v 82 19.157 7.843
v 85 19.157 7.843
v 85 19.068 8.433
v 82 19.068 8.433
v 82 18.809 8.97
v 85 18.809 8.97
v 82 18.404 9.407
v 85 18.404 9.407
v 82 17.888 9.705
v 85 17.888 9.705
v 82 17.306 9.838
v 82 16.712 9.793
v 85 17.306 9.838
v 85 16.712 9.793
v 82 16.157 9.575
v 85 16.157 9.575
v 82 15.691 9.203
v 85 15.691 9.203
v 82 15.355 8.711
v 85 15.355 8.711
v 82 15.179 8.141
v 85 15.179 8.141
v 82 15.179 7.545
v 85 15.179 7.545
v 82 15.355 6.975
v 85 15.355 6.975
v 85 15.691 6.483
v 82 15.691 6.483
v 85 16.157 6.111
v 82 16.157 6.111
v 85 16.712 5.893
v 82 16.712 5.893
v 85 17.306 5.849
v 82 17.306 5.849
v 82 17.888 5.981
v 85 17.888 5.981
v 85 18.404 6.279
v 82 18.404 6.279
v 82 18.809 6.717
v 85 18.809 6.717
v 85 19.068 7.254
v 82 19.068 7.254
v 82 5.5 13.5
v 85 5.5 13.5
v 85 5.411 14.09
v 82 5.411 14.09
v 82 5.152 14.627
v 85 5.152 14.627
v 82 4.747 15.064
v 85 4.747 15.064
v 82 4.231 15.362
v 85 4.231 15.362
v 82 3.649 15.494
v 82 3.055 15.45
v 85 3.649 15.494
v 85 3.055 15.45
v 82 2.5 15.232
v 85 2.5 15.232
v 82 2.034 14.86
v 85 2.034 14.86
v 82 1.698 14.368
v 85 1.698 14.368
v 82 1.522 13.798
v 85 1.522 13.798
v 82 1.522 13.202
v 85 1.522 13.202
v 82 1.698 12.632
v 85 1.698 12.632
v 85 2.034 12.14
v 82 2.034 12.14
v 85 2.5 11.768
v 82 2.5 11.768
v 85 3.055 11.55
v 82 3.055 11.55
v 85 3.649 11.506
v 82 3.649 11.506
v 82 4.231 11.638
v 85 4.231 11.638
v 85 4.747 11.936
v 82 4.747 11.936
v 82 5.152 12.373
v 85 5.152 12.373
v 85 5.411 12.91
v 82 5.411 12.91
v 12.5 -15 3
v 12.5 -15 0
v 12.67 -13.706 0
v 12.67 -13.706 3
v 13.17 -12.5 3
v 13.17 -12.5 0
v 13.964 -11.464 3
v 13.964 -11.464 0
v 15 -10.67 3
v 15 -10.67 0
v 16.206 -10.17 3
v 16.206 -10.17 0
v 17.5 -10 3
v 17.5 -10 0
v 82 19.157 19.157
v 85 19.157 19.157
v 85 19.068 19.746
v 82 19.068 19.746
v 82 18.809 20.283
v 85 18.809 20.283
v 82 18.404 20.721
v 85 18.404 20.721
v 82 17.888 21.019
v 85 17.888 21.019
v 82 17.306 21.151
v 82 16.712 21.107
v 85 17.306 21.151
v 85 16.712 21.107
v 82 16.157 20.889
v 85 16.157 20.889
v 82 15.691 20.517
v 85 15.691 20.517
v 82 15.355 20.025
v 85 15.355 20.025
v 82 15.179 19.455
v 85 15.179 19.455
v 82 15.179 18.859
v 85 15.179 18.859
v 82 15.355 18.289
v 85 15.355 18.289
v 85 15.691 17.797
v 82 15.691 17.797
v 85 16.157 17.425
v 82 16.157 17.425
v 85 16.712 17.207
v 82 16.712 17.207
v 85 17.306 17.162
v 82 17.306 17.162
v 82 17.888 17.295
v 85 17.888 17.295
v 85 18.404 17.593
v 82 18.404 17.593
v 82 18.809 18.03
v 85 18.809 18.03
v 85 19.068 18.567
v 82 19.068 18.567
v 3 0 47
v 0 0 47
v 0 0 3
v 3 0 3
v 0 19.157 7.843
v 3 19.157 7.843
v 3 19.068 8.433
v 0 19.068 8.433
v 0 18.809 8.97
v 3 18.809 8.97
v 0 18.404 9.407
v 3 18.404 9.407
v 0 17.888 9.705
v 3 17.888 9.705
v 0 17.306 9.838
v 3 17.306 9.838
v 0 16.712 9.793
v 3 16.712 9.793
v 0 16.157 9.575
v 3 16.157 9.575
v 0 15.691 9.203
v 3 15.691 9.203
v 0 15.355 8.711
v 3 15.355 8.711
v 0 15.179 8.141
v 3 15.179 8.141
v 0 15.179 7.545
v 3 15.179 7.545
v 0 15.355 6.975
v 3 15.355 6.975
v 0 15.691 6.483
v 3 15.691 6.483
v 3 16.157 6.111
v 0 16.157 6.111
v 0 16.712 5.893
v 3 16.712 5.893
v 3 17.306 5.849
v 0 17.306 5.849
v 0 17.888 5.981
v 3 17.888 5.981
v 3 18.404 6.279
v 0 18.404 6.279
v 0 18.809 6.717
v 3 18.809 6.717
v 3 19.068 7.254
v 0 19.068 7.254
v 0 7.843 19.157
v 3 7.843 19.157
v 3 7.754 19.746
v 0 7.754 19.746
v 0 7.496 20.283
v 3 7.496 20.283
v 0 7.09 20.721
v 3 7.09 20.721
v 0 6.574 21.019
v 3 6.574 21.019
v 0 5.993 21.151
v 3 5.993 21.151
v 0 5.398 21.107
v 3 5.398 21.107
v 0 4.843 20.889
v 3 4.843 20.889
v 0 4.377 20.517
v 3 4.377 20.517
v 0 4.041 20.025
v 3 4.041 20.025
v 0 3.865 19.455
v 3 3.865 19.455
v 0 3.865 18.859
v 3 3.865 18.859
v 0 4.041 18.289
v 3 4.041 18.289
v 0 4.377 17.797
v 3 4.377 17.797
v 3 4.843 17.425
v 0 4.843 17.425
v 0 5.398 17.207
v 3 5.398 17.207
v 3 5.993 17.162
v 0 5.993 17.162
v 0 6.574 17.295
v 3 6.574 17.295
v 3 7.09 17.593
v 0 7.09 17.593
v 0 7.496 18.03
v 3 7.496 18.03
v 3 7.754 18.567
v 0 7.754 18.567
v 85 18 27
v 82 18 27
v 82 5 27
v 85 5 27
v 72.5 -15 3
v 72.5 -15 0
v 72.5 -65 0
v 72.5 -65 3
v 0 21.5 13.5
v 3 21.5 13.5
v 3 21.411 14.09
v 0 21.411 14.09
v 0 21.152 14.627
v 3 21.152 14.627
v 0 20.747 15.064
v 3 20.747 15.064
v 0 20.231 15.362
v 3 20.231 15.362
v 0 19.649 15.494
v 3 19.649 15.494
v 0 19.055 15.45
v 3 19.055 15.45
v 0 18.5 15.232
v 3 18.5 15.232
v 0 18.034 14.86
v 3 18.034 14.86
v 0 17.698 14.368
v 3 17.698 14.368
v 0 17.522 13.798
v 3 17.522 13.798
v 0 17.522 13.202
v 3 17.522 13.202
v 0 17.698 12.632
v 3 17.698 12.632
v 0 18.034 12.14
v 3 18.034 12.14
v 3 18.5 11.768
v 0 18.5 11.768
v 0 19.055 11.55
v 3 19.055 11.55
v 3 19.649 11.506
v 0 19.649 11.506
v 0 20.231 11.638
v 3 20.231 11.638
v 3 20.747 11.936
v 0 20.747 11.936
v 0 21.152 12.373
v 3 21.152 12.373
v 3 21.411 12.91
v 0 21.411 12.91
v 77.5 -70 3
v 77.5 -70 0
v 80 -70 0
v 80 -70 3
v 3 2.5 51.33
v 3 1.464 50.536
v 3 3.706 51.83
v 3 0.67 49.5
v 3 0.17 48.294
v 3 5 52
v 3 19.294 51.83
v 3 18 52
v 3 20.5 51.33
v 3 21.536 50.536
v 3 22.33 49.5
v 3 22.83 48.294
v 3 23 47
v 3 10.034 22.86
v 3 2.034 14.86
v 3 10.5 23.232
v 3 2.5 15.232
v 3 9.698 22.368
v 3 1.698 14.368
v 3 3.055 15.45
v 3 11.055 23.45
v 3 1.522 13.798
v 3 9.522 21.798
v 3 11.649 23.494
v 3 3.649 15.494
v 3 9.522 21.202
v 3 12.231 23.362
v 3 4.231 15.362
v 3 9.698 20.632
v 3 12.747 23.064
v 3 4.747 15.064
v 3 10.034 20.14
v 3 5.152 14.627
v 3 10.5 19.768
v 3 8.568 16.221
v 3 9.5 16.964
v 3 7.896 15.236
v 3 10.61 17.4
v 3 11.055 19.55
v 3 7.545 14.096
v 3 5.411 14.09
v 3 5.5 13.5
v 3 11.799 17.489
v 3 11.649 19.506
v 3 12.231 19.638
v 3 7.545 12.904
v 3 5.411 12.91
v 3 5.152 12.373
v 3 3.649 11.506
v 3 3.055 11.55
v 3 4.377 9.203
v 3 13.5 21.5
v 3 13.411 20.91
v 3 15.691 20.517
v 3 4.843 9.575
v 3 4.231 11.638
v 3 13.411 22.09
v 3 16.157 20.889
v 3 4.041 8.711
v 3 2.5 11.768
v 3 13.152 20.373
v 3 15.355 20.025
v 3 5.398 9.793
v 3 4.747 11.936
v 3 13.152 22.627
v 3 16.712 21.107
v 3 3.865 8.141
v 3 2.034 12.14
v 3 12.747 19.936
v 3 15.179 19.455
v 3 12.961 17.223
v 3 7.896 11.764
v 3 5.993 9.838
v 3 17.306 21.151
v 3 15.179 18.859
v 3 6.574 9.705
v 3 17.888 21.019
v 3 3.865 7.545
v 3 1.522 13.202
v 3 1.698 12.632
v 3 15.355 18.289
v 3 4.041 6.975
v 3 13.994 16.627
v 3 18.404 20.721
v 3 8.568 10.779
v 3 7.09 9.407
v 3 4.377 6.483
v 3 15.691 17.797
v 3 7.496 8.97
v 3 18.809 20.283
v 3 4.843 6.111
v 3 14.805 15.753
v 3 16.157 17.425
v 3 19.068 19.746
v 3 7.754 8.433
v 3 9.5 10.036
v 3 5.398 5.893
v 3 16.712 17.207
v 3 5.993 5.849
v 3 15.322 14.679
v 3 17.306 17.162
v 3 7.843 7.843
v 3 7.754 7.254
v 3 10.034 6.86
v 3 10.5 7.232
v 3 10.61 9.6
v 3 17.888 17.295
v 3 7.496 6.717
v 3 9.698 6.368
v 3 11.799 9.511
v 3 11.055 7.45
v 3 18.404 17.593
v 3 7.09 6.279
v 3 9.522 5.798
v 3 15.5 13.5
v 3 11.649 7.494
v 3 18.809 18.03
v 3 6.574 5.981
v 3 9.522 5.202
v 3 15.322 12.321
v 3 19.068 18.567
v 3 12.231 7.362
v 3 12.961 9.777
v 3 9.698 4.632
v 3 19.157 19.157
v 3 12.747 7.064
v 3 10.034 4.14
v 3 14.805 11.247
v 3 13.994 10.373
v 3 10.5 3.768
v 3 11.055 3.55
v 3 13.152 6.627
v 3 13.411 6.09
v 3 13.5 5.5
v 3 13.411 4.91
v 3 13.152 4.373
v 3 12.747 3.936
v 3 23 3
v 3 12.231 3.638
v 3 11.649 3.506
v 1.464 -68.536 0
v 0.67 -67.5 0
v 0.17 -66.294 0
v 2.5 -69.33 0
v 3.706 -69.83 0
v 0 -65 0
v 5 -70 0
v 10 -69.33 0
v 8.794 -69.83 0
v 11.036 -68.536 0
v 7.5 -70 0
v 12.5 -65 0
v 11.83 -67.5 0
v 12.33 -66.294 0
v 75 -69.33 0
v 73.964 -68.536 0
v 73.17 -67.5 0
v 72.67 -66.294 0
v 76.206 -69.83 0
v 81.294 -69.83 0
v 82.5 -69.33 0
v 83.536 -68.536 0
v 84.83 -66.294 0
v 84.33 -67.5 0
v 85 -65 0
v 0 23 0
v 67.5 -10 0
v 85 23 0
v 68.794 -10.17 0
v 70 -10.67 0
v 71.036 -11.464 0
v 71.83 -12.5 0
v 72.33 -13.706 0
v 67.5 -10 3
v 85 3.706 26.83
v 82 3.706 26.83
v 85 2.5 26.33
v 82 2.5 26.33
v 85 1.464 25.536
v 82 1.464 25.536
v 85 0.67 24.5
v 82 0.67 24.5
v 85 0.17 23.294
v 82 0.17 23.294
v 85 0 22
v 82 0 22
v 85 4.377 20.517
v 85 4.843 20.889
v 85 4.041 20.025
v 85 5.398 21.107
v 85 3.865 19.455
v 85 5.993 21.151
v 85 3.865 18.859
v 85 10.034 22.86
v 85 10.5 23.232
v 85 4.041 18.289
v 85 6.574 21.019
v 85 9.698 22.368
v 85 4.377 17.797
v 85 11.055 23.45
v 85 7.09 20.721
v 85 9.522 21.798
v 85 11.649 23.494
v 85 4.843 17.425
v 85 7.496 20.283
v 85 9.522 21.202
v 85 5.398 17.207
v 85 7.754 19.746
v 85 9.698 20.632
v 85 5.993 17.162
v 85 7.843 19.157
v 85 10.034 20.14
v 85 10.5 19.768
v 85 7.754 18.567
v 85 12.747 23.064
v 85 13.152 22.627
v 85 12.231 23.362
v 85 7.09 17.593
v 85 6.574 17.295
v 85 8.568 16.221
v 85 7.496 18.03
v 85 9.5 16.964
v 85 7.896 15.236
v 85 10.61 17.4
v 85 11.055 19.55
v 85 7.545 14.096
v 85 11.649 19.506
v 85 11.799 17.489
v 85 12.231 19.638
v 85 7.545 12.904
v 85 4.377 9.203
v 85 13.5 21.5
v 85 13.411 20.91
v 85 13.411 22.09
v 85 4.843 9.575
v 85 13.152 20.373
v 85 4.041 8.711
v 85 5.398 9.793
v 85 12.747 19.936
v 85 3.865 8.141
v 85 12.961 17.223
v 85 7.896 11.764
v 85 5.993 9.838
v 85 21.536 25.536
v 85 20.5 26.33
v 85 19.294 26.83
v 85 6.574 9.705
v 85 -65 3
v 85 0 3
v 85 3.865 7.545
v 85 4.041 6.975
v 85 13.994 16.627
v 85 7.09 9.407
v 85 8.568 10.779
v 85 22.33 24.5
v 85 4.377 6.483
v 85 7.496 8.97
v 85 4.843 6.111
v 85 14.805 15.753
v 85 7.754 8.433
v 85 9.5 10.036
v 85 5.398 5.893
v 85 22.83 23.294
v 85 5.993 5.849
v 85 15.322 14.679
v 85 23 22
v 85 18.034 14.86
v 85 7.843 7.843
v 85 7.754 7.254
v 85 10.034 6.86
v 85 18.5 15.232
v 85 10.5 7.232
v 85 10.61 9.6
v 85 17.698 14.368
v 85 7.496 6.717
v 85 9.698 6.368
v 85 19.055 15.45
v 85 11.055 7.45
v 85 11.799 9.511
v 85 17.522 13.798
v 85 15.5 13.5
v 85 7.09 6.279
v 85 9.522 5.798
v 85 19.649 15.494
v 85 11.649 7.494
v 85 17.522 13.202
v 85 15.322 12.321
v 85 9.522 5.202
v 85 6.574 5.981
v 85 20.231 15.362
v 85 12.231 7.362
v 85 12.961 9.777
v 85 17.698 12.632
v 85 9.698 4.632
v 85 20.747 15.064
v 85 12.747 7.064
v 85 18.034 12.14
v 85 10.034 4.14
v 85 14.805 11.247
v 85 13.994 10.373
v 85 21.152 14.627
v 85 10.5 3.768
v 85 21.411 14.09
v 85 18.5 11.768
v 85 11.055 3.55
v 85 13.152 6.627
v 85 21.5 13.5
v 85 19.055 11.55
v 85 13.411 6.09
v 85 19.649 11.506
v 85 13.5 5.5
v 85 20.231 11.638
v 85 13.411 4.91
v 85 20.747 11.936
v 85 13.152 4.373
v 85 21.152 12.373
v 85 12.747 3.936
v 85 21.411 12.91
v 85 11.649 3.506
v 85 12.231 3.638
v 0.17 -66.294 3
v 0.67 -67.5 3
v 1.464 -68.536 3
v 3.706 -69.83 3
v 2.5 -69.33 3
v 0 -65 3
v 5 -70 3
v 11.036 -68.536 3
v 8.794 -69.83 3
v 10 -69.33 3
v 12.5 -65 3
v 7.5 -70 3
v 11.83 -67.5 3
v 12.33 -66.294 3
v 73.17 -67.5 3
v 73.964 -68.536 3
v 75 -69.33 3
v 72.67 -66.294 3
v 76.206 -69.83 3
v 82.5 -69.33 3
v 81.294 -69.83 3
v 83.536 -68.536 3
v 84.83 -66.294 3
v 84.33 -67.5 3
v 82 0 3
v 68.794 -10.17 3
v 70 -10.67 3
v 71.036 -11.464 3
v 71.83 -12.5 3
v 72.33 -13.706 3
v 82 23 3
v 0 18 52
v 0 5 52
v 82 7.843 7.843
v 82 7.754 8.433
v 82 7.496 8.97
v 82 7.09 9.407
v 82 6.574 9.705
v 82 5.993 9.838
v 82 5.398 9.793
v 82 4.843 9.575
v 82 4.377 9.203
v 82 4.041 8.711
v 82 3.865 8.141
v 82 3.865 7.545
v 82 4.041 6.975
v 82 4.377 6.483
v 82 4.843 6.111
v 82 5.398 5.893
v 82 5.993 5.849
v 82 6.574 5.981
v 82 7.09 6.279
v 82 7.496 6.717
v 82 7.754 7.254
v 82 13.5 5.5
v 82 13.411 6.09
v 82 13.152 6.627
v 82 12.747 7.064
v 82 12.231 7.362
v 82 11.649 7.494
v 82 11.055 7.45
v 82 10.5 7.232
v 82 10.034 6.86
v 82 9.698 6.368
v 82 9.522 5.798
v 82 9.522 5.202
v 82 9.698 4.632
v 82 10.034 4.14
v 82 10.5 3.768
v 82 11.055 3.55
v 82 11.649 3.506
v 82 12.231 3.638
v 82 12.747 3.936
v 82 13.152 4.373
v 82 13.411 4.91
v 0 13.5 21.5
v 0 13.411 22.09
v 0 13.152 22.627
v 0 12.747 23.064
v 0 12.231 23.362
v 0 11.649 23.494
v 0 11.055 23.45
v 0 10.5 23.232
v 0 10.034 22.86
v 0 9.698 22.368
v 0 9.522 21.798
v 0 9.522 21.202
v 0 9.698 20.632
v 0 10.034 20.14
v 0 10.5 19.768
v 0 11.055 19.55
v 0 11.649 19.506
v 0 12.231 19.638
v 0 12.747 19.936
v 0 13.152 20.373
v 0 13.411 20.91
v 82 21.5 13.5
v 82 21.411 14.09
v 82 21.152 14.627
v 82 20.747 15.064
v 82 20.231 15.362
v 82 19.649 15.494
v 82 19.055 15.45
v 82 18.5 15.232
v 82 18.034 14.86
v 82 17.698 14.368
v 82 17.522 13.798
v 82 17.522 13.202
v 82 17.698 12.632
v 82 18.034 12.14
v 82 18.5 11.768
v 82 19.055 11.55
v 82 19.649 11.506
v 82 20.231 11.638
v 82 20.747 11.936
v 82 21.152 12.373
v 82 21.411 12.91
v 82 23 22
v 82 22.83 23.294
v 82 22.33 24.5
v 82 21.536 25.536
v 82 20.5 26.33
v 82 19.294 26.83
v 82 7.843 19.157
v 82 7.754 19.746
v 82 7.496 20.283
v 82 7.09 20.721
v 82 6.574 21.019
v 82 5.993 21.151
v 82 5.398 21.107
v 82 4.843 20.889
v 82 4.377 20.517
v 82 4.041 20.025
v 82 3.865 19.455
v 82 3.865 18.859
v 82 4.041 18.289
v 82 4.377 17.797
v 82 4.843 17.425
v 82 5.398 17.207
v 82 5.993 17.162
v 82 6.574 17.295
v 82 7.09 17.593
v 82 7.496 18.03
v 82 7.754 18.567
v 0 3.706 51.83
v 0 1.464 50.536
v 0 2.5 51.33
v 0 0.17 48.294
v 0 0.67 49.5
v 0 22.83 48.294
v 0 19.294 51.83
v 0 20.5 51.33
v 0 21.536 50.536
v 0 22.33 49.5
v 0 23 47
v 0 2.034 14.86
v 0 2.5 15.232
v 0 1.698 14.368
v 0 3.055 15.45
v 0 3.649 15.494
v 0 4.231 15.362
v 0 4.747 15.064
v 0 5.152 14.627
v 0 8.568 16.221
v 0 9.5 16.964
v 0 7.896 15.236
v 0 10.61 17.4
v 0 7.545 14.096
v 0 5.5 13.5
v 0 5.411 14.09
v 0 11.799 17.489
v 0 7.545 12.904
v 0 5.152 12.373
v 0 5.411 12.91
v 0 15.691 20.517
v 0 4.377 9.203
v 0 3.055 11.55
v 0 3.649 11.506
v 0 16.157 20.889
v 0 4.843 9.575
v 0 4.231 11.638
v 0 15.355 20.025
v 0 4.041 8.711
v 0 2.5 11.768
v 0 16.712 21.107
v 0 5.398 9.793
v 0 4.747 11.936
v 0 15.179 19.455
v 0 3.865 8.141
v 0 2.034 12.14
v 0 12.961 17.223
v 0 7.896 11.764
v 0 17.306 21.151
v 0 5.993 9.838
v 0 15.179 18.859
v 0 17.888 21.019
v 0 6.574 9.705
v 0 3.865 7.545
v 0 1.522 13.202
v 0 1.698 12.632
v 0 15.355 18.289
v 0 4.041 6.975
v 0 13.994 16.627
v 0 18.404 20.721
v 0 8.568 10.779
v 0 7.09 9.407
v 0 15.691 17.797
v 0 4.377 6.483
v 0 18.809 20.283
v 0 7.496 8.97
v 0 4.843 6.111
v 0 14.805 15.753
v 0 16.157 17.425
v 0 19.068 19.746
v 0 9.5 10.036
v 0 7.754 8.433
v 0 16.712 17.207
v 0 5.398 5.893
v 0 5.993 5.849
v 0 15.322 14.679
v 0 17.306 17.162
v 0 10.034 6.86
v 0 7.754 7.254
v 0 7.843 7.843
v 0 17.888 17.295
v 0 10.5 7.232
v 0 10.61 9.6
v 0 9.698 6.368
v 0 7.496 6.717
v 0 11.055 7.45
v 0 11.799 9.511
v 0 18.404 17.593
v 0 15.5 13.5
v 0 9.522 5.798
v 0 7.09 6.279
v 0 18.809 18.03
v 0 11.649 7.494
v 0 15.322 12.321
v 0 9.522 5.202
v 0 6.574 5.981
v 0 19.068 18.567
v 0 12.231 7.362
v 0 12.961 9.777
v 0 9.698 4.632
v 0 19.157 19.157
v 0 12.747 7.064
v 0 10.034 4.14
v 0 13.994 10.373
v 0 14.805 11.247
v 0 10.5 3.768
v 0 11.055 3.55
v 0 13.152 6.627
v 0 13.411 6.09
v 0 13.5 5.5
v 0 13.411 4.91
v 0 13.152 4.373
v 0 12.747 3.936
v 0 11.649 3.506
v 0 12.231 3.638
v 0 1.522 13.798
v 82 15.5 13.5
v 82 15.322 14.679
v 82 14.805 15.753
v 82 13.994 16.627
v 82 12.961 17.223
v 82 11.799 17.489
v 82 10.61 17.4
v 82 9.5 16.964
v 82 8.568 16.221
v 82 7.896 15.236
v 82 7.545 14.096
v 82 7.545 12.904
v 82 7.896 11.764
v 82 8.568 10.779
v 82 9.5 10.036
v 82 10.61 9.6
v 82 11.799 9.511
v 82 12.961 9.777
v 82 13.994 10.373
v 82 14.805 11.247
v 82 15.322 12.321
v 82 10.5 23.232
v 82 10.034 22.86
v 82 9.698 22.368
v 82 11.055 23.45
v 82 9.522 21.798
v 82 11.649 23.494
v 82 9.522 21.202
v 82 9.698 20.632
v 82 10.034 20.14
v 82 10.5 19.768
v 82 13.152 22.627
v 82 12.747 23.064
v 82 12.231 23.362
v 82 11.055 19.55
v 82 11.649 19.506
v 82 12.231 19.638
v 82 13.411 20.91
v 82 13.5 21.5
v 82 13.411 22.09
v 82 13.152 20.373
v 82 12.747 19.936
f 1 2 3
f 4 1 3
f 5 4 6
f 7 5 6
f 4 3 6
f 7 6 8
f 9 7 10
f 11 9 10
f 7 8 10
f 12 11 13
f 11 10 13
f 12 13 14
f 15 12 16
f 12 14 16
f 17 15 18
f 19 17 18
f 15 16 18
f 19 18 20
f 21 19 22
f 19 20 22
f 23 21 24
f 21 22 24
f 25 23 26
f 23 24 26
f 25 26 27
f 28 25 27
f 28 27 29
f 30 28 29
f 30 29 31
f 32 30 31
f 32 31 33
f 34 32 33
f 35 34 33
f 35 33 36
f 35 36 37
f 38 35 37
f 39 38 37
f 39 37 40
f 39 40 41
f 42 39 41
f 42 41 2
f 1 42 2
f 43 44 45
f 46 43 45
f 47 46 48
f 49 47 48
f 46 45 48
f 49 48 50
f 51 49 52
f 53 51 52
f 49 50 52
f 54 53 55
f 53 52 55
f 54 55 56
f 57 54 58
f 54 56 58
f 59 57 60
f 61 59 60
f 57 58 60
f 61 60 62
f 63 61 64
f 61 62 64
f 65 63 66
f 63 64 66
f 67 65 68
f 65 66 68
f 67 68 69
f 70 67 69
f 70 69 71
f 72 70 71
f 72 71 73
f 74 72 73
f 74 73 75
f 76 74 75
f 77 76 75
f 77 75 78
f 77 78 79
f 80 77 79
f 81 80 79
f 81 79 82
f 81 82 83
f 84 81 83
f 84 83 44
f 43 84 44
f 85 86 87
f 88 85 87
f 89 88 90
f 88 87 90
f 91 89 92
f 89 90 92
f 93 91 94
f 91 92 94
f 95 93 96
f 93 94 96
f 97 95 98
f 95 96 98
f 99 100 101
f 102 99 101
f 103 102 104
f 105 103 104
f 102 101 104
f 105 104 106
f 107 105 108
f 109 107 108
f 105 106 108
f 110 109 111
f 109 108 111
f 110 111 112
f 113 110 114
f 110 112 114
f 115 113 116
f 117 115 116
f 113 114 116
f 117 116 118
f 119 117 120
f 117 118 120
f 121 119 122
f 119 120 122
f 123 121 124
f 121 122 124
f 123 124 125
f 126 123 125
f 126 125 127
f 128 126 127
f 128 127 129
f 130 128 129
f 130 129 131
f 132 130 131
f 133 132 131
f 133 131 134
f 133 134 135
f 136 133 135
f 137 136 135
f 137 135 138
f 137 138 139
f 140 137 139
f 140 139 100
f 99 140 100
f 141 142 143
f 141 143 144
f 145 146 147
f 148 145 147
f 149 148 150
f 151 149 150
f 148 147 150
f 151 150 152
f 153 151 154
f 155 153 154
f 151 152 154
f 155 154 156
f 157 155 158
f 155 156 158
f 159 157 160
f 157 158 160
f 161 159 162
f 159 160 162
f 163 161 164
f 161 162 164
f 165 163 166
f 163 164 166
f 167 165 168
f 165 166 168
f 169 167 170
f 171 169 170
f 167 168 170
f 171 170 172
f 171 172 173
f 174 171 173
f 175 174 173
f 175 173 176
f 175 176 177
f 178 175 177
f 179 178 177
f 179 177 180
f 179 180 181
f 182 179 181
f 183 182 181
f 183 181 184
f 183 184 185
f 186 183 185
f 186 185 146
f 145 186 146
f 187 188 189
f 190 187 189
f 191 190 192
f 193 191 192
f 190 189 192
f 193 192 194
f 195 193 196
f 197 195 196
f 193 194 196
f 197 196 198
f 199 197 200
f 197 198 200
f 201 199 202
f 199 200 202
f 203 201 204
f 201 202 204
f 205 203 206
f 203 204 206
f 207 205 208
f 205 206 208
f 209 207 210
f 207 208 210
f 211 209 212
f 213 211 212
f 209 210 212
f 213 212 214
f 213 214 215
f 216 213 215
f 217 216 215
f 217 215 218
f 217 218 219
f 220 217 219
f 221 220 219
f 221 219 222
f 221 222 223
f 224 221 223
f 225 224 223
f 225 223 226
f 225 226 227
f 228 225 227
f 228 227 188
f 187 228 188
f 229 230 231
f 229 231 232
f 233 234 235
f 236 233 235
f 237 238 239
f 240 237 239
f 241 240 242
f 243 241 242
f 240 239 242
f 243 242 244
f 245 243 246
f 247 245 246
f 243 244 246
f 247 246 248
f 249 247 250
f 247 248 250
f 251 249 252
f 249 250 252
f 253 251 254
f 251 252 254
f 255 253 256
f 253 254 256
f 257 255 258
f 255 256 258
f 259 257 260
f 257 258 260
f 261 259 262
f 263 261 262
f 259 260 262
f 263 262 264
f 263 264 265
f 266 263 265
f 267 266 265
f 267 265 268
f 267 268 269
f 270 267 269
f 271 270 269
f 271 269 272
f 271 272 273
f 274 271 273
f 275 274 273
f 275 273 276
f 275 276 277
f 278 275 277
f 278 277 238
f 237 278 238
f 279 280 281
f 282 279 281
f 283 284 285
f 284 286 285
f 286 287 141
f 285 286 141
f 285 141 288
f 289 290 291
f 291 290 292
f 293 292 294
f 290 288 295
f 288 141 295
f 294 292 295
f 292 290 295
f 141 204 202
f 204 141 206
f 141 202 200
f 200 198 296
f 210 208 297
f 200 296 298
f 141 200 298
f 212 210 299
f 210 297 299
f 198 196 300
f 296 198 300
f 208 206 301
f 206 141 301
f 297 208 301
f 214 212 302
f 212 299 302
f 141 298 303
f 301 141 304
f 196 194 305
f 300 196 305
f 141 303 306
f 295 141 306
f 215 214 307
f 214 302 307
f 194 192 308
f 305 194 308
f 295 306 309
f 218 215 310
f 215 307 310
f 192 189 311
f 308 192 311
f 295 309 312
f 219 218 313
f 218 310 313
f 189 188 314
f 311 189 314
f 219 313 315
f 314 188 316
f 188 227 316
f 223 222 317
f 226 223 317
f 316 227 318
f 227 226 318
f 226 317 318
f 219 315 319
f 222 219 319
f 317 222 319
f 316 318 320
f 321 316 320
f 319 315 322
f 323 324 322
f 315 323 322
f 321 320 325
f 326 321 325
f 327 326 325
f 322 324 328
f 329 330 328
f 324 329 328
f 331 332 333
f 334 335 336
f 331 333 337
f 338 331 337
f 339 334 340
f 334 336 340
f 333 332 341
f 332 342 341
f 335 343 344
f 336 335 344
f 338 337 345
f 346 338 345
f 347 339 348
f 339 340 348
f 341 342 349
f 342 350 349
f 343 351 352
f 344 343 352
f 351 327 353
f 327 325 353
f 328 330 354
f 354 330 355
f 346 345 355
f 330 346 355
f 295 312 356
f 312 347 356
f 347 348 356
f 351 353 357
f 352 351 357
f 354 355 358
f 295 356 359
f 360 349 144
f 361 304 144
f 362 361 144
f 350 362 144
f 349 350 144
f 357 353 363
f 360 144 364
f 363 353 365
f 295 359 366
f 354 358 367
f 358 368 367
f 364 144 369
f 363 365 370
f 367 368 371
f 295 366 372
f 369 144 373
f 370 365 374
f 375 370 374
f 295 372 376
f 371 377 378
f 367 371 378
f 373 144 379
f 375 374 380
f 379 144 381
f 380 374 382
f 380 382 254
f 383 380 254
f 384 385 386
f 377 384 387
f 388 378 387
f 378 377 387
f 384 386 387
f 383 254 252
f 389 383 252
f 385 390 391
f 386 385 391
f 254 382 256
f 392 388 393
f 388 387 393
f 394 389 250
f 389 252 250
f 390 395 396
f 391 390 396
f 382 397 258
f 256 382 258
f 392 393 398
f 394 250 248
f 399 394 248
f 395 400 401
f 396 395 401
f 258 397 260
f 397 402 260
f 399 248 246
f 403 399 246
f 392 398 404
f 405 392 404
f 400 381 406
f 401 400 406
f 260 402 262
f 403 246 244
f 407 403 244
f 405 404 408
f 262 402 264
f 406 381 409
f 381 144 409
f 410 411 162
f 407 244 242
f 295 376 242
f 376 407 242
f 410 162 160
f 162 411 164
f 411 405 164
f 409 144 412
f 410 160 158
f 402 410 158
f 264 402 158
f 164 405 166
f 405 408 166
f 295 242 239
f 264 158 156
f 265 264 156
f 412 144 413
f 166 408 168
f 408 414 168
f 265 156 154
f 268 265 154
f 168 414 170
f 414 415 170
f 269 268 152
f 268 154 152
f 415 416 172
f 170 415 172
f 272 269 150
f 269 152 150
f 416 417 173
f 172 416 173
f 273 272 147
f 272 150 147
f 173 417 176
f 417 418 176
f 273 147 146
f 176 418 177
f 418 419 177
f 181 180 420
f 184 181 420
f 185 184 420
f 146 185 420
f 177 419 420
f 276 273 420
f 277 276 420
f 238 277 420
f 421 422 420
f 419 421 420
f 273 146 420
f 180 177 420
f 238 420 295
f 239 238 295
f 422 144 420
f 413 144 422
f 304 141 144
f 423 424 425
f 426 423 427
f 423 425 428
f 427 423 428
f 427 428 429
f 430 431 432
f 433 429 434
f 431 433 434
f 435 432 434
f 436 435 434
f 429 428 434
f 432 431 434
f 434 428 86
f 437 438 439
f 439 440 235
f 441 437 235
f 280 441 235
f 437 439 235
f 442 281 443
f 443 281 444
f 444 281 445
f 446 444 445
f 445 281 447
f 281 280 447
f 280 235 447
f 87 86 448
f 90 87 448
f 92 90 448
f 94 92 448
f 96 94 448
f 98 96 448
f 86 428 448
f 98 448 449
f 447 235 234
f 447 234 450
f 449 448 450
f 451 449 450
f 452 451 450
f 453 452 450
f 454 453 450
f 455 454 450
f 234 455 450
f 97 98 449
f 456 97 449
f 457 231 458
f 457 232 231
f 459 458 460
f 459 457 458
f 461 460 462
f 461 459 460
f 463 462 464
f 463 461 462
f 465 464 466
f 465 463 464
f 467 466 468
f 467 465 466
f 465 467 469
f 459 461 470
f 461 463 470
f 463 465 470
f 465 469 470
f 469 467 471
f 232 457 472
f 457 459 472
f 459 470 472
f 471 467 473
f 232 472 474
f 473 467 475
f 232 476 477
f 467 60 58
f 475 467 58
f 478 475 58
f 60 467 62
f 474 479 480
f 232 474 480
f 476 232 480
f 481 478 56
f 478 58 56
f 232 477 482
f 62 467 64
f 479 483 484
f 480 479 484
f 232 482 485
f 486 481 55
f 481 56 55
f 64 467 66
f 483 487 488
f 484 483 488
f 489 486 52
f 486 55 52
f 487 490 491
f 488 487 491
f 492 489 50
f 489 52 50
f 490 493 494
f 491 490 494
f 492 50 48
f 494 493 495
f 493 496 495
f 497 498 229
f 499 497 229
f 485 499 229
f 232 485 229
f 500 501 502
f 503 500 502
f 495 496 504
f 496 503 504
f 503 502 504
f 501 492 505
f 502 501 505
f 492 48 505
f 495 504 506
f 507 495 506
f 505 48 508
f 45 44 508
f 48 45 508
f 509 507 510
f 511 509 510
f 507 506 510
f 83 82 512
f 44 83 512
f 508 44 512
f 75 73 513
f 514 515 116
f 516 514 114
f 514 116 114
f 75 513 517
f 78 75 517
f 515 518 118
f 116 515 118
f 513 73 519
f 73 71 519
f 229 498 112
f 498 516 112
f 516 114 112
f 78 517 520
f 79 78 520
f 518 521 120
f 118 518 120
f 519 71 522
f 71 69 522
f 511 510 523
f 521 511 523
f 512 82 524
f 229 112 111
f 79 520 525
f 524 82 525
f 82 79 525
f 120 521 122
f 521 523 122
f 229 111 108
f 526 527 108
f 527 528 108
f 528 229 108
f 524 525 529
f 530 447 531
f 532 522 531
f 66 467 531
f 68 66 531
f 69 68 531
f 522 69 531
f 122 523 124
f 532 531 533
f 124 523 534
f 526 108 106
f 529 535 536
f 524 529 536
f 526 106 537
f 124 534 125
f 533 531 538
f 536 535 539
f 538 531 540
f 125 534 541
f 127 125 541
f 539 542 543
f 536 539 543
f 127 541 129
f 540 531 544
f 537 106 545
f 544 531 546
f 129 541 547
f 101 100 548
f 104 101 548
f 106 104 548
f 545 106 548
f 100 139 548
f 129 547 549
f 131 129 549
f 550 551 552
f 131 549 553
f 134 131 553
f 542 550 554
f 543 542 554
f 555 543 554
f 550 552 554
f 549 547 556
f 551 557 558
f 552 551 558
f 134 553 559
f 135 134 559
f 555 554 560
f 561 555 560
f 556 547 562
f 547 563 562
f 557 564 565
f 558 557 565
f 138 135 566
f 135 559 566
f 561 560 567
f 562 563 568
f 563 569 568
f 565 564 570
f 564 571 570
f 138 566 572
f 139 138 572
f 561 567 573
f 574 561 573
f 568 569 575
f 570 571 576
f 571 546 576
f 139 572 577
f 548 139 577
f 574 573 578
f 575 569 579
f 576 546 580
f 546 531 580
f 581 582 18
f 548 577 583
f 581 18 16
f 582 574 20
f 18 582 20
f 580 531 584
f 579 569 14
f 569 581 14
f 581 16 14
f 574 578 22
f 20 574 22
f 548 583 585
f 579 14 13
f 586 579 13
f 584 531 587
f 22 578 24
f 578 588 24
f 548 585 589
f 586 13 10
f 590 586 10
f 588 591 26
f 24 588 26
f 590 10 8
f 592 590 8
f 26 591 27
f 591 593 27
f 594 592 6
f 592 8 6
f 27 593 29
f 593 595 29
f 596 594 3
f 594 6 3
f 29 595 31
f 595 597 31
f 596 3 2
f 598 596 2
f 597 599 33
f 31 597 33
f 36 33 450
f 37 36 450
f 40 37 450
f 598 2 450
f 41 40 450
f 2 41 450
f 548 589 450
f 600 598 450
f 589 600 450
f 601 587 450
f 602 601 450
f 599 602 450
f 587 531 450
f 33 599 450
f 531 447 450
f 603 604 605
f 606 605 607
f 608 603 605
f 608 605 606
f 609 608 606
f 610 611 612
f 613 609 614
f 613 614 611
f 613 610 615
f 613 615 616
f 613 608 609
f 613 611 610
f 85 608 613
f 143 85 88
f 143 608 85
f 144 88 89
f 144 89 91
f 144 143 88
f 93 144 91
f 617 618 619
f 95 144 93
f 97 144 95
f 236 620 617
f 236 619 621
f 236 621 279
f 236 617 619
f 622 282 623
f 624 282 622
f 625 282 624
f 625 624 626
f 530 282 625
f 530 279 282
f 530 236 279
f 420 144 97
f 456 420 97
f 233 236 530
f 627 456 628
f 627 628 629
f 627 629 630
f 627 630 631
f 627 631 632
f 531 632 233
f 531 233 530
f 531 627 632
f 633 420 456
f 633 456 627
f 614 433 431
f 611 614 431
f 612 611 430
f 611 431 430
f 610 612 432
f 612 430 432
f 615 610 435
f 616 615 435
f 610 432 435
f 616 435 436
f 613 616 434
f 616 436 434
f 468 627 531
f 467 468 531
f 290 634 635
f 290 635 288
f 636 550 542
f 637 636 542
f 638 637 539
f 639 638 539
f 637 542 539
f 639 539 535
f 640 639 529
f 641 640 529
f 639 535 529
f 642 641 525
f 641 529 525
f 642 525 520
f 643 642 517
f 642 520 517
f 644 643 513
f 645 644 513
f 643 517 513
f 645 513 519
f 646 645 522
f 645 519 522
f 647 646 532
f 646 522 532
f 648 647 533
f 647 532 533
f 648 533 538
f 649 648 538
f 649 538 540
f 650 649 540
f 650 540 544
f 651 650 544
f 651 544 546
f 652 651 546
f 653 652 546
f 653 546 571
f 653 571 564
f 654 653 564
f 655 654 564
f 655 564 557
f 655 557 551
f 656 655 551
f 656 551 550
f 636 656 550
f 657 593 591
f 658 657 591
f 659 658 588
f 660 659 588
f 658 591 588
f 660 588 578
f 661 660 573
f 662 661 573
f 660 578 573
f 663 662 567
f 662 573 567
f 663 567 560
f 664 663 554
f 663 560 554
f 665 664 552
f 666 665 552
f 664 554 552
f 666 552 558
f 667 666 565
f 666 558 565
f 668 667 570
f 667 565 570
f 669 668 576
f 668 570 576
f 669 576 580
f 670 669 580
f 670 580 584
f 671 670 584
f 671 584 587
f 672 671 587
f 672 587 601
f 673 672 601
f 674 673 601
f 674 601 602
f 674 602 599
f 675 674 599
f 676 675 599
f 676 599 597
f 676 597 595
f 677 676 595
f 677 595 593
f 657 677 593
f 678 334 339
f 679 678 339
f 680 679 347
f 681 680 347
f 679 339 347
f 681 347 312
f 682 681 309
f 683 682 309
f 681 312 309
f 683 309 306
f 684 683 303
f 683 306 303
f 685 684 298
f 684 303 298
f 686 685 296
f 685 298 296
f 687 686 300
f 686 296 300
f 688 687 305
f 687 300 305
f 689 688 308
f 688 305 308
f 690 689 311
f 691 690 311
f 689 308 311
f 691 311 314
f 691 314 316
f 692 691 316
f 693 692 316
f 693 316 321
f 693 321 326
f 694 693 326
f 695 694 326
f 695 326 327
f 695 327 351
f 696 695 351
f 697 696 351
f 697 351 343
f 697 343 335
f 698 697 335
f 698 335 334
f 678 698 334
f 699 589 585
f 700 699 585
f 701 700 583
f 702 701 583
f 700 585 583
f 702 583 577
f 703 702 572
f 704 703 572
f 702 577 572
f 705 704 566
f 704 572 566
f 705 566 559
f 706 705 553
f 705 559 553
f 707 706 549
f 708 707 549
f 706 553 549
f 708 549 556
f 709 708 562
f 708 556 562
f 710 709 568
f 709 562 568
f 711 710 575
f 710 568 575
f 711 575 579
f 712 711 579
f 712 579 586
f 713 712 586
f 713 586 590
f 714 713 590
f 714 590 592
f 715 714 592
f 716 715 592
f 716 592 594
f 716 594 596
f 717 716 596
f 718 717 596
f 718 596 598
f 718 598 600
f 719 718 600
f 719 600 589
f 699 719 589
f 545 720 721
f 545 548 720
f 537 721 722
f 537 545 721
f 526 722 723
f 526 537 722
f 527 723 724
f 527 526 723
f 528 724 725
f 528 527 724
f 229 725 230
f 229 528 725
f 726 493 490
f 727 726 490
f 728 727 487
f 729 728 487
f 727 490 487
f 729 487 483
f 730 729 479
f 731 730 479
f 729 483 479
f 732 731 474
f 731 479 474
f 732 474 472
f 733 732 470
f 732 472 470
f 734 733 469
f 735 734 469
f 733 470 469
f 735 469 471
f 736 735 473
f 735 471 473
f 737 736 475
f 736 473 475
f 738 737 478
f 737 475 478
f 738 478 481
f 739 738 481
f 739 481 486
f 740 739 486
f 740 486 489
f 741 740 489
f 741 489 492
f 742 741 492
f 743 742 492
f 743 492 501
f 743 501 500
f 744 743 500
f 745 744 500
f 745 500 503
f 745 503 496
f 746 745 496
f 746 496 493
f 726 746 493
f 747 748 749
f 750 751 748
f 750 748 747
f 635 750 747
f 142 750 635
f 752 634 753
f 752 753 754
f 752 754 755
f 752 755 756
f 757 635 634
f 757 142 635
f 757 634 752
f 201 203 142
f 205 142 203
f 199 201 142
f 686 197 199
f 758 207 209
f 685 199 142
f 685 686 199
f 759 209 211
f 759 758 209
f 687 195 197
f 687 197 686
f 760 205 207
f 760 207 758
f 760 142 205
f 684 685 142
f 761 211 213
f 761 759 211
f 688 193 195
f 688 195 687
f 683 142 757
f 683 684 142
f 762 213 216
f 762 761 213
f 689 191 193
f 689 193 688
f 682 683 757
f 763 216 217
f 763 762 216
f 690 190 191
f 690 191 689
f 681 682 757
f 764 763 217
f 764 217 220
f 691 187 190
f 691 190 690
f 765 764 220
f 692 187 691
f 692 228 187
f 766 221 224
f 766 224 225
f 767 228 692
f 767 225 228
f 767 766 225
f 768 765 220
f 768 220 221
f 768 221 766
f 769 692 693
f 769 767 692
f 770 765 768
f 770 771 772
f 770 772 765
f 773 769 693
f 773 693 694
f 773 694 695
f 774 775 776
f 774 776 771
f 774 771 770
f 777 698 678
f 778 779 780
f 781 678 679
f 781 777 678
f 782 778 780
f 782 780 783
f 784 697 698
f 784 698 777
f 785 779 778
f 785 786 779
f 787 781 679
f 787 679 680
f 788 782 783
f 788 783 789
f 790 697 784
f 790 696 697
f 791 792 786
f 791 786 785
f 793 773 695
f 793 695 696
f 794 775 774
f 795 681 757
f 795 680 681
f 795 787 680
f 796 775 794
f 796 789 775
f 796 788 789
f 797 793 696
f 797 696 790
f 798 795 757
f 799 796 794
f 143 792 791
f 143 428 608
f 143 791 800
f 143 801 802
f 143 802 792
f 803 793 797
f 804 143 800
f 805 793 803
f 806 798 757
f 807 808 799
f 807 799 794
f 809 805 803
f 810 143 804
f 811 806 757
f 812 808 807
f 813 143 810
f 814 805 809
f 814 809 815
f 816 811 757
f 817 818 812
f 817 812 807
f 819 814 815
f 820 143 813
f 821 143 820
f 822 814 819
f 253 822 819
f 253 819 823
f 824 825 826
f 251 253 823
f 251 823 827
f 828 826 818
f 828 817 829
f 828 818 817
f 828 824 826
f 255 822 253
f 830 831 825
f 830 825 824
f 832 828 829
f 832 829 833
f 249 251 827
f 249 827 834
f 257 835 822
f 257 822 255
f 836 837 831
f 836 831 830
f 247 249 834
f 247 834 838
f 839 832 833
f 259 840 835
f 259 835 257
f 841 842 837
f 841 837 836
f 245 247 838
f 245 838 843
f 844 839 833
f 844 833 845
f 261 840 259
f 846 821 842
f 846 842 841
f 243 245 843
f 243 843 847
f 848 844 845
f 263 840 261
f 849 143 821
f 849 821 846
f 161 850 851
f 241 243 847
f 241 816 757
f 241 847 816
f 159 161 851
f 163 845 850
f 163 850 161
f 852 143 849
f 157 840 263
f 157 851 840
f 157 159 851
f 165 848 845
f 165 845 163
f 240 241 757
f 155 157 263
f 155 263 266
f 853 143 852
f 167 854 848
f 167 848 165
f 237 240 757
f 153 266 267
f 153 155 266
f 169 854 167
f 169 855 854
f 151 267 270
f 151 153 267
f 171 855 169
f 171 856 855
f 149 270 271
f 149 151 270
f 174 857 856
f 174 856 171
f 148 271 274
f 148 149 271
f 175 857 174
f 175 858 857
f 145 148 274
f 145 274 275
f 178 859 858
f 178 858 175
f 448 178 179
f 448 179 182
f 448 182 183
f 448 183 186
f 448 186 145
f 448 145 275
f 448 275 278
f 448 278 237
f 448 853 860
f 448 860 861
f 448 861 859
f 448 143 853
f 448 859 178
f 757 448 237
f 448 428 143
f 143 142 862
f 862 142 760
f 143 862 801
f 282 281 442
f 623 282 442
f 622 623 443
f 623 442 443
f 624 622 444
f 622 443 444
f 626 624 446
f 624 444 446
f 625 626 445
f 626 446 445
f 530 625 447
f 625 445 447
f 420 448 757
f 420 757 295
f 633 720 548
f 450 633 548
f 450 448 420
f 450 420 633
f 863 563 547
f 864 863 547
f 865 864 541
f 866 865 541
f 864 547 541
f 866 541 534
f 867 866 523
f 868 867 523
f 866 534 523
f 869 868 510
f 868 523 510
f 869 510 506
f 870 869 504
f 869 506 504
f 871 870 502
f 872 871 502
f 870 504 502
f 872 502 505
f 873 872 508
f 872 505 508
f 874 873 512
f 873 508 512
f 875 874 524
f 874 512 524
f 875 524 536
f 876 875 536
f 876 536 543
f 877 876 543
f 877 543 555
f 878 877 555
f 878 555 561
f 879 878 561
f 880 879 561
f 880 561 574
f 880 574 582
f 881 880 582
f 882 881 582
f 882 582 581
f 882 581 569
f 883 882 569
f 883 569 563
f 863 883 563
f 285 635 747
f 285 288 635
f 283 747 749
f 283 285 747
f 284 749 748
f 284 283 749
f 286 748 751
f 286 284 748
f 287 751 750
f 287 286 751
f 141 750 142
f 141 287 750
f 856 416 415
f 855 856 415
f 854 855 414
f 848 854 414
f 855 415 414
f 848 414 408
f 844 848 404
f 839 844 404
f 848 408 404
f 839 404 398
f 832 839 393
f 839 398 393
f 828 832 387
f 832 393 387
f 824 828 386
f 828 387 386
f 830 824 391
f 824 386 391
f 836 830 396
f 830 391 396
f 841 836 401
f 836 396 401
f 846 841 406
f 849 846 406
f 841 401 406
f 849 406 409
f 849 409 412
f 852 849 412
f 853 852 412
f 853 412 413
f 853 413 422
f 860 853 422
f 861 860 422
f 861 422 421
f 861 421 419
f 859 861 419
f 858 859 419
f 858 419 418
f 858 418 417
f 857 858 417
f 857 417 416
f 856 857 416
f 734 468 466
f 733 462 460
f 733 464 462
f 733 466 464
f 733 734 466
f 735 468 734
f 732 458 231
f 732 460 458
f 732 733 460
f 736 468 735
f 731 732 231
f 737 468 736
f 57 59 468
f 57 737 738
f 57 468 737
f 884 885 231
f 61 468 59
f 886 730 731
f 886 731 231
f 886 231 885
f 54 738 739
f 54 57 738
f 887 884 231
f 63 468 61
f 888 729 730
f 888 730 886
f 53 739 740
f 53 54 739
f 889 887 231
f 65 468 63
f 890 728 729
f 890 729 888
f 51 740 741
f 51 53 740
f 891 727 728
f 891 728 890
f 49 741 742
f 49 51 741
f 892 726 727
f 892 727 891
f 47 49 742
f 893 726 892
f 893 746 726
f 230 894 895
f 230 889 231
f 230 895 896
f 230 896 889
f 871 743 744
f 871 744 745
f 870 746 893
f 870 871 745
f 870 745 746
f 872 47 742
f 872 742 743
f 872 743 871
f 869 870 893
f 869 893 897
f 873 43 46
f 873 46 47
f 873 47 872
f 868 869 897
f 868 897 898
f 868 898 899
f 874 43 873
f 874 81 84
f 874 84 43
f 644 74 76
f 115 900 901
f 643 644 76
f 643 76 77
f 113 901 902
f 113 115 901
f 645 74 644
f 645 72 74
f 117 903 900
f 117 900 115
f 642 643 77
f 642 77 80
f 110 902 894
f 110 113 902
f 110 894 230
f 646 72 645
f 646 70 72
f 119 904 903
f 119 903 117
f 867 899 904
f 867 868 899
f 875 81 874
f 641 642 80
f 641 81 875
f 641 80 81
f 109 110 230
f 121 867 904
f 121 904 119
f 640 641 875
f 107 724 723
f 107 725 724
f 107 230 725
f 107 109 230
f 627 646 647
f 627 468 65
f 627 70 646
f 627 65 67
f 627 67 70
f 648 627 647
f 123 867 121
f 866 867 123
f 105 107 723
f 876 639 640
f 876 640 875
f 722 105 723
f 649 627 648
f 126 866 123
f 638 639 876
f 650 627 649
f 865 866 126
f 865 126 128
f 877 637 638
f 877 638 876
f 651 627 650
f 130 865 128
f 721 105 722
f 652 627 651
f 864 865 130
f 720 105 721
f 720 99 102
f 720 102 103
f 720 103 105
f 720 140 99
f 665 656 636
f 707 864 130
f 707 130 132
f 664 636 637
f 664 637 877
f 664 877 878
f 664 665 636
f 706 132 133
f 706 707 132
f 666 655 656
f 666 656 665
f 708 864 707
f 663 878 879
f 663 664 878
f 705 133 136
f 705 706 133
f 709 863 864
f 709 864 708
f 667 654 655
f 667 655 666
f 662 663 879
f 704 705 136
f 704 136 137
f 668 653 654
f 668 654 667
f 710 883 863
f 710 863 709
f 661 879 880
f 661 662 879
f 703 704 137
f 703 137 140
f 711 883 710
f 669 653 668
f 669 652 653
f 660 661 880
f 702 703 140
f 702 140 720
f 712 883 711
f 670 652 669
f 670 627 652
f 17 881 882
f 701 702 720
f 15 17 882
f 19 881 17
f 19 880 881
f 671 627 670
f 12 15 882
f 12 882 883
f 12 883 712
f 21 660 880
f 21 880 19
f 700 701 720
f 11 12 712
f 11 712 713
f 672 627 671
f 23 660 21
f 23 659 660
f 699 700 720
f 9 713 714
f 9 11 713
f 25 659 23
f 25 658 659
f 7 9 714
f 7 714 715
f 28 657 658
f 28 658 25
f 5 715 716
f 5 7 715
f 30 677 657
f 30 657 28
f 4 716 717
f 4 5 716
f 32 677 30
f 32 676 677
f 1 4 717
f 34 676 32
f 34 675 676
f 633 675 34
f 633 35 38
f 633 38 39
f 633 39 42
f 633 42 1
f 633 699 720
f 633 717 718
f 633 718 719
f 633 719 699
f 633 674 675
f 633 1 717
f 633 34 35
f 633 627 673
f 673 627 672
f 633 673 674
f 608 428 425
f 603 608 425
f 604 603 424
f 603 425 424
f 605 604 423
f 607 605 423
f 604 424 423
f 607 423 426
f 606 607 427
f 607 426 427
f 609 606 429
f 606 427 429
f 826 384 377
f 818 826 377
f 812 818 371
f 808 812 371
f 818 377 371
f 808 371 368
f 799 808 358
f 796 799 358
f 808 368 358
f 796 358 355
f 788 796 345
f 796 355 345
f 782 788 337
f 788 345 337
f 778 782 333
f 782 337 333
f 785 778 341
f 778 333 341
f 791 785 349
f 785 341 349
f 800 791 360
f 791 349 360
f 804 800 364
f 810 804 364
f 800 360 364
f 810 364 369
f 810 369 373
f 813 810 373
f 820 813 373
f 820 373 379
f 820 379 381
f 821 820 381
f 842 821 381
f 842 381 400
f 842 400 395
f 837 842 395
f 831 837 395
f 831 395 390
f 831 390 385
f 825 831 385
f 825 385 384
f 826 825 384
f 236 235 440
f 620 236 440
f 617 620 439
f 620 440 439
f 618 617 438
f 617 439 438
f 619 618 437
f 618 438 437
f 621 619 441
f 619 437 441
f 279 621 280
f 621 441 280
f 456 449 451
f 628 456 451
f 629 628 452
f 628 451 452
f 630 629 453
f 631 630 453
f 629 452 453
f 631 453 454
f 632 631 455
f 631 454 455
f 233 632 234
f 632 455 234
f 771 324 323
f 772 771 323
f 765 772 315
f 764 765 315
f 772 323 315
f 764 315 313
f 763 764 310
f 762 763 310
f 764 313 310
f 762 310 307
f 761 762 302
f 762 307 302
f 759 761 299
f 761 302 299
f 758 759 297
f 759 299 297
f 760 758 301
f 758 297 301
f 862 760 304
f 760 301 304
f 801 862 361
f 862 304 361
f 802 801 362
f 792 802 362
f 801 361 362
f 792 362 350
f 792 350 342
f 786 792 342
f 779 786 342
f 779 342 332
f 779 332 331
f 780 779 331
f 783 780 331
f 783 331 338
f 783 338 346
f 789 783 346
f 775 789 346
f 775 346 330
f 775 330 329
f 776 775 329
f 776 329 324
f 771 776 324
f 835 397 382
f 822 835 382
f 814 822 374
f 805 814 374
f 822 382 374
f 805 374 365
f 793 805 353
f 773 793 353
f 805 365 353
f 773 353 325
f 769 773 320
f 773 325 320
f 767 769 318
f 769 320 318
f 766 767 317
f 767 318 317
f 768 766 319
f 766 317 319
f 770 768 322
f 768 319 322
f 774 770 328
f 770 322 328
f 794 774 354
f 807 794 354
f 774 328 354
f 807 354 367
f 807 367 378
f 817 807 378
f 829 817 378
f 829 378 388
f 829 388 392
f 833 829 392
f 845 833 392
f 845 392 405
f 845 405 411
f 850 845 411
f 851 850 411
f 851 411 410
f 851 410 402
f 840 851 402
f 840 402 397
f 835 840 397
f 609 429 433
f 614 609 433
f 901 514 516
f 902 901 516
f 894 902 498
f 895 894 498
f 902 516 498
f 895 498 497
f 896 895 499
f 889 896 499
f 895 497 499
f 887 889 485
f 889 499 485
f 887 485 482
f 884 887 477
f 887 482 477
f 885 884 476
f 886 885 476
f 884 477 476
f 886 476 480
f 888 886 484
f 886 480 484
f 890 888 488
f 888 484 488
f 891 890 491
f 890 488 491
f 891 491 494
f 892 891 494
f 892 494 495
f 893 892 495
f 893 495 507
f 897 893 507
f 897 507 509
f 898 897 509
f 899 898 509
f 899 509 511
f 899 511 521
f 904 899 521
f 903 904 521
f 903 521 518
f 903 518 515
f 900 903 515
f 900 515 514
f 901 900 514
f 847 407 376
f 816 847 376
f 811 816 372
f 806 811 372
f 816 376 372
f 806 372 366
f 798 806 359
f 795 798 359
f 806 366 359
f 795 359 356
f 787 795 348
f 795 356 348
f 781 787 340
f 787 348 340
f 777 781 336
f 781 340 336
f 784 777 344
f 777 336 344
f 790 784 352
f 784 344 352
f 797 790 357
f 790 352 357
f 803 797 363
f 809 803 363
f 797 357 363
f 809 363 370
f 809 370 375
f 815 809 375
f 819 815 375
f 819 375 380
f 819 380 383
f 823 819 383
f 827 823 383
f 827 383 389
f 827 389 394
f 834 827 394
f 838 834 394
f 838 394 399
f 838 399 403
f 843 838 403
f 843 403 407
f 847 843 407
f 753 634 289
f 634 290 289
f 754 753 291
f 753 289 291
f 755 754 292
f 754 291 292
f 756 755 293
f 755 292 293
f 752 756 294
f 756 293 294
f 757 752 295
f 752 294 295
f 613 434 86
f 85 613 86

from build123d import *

# Parameters (mm, degrees)
F0_W     = 85
F0_H     = 23
F1_DEPTH = 3
F2_W     = 3
F2_H     = 23
F3_DEPTH = 24
F4_W     = 3
F4_H     = 23
F5_DEPTH = 25
F6_R     = 4
F6_R_2   = 2
F7_DEPTH = 250
F8_R     = 5


with BuildPart() as f1:
    # F0 (on Top) → F1 (new body)
    with BuildSketch(Plane.XY):
        with Locations((42.5, 11.5)):
            Rectangle(F0_W, F0_H)
        with BuildLine():
            Line((85, 0), (0, 0))
            Line((0, 0), (0, -10))
            Line((0, -10), (0, -65))
            ThreePointArc((0, -65), (1.464466, -68.535534), (5, -70))
            Line((5, -70), (7.5, -70))
            ThreePointArc((7.5, -70), (11.035534, -68.535534), (12.5, -65))
            Line((12.5, -65), (12.5, -15))
            ThreePointArc((12.5, -15), (13.964466, -11.464466), (17.5, -10))
            Line((17.5, -10), (67.5, -10))
            ThreePointArc((67.5, -10), (71.035534, -11.464466), (72.5, -15))
            Line((72.5, -15), (72.5, -65))
            ThreePointArc((72.5, -65), (73.964466, -68.535534), (77.5, -70))
            Line((77.5, -70), (80, -70))
            ThreePointArc((80, -70), (83.535534, -68.535534), (85, -65))
            Line((85, -65), (85, -10))
            Line((85, -10), (85, 0))
        make_face()
    extrude(amount=F1_DEPTH)

    # F2 (on face) → F3 (join)
    with BuildSketch(Plane.XY.offset(3)):
        with Locations((1.5, 11.5)):
            Rectangle(F2_W, F2_H)
        with Locations((83.5, 11.5)):
            Rectangle(F2_W, F2_H)
    extrude(amount=F3_DEPTH)

    # F4 (on face) → F5 (join)
    with BuildSketch(Plane.XY.offset(27)):
        with Locations((1.5, 11.5)):
            Rectangle(F4_W, F4_H)
    extrude(amount=F5_DEPTH)

    # F6 (on face) → F7 (cut)
    with BuildSketch(Plane.YZ.offset(85)):
        with Locations((11.5, 13.5)):
            Circle(F6_R)
        with Locations((5.843146, 19.156854)):
            Circle(F6_R_2)
        with Locations((11.5, 21.5)):
            Circle(F6_R_2)
        with Locations((17.156854, 19.156854)):
            Circle(F6_R_2)
        with Locations((19.5, 13.5)):
            Circle(F6_R_2)
        with Locations((17.156854, 7.843146)):
            Circle(F6_R_2)
        with Locations((11.5, 5.5)):
            Circle(F6_R_2)
        with Locations((5.843146, 7.843146)):
            Circle(F6_R_2)
        with Locations((3.5, 13.5)):
            Circle(F6_R_2)
    extrude(amount=-F7_DEPTH, mode=Mode.SUBTRACT)

    # F8
    f8_edges = [f1.edges().sort_by_distance(p)[0] for p in [
        (1.5, 23, 52),
        (1.5, 0, 52),
        (83.5, 23, 27),
        (83.5, 0, 27),
    ]]
    fillet(f8_edges, radius=F8_R)


solid = f1.part
